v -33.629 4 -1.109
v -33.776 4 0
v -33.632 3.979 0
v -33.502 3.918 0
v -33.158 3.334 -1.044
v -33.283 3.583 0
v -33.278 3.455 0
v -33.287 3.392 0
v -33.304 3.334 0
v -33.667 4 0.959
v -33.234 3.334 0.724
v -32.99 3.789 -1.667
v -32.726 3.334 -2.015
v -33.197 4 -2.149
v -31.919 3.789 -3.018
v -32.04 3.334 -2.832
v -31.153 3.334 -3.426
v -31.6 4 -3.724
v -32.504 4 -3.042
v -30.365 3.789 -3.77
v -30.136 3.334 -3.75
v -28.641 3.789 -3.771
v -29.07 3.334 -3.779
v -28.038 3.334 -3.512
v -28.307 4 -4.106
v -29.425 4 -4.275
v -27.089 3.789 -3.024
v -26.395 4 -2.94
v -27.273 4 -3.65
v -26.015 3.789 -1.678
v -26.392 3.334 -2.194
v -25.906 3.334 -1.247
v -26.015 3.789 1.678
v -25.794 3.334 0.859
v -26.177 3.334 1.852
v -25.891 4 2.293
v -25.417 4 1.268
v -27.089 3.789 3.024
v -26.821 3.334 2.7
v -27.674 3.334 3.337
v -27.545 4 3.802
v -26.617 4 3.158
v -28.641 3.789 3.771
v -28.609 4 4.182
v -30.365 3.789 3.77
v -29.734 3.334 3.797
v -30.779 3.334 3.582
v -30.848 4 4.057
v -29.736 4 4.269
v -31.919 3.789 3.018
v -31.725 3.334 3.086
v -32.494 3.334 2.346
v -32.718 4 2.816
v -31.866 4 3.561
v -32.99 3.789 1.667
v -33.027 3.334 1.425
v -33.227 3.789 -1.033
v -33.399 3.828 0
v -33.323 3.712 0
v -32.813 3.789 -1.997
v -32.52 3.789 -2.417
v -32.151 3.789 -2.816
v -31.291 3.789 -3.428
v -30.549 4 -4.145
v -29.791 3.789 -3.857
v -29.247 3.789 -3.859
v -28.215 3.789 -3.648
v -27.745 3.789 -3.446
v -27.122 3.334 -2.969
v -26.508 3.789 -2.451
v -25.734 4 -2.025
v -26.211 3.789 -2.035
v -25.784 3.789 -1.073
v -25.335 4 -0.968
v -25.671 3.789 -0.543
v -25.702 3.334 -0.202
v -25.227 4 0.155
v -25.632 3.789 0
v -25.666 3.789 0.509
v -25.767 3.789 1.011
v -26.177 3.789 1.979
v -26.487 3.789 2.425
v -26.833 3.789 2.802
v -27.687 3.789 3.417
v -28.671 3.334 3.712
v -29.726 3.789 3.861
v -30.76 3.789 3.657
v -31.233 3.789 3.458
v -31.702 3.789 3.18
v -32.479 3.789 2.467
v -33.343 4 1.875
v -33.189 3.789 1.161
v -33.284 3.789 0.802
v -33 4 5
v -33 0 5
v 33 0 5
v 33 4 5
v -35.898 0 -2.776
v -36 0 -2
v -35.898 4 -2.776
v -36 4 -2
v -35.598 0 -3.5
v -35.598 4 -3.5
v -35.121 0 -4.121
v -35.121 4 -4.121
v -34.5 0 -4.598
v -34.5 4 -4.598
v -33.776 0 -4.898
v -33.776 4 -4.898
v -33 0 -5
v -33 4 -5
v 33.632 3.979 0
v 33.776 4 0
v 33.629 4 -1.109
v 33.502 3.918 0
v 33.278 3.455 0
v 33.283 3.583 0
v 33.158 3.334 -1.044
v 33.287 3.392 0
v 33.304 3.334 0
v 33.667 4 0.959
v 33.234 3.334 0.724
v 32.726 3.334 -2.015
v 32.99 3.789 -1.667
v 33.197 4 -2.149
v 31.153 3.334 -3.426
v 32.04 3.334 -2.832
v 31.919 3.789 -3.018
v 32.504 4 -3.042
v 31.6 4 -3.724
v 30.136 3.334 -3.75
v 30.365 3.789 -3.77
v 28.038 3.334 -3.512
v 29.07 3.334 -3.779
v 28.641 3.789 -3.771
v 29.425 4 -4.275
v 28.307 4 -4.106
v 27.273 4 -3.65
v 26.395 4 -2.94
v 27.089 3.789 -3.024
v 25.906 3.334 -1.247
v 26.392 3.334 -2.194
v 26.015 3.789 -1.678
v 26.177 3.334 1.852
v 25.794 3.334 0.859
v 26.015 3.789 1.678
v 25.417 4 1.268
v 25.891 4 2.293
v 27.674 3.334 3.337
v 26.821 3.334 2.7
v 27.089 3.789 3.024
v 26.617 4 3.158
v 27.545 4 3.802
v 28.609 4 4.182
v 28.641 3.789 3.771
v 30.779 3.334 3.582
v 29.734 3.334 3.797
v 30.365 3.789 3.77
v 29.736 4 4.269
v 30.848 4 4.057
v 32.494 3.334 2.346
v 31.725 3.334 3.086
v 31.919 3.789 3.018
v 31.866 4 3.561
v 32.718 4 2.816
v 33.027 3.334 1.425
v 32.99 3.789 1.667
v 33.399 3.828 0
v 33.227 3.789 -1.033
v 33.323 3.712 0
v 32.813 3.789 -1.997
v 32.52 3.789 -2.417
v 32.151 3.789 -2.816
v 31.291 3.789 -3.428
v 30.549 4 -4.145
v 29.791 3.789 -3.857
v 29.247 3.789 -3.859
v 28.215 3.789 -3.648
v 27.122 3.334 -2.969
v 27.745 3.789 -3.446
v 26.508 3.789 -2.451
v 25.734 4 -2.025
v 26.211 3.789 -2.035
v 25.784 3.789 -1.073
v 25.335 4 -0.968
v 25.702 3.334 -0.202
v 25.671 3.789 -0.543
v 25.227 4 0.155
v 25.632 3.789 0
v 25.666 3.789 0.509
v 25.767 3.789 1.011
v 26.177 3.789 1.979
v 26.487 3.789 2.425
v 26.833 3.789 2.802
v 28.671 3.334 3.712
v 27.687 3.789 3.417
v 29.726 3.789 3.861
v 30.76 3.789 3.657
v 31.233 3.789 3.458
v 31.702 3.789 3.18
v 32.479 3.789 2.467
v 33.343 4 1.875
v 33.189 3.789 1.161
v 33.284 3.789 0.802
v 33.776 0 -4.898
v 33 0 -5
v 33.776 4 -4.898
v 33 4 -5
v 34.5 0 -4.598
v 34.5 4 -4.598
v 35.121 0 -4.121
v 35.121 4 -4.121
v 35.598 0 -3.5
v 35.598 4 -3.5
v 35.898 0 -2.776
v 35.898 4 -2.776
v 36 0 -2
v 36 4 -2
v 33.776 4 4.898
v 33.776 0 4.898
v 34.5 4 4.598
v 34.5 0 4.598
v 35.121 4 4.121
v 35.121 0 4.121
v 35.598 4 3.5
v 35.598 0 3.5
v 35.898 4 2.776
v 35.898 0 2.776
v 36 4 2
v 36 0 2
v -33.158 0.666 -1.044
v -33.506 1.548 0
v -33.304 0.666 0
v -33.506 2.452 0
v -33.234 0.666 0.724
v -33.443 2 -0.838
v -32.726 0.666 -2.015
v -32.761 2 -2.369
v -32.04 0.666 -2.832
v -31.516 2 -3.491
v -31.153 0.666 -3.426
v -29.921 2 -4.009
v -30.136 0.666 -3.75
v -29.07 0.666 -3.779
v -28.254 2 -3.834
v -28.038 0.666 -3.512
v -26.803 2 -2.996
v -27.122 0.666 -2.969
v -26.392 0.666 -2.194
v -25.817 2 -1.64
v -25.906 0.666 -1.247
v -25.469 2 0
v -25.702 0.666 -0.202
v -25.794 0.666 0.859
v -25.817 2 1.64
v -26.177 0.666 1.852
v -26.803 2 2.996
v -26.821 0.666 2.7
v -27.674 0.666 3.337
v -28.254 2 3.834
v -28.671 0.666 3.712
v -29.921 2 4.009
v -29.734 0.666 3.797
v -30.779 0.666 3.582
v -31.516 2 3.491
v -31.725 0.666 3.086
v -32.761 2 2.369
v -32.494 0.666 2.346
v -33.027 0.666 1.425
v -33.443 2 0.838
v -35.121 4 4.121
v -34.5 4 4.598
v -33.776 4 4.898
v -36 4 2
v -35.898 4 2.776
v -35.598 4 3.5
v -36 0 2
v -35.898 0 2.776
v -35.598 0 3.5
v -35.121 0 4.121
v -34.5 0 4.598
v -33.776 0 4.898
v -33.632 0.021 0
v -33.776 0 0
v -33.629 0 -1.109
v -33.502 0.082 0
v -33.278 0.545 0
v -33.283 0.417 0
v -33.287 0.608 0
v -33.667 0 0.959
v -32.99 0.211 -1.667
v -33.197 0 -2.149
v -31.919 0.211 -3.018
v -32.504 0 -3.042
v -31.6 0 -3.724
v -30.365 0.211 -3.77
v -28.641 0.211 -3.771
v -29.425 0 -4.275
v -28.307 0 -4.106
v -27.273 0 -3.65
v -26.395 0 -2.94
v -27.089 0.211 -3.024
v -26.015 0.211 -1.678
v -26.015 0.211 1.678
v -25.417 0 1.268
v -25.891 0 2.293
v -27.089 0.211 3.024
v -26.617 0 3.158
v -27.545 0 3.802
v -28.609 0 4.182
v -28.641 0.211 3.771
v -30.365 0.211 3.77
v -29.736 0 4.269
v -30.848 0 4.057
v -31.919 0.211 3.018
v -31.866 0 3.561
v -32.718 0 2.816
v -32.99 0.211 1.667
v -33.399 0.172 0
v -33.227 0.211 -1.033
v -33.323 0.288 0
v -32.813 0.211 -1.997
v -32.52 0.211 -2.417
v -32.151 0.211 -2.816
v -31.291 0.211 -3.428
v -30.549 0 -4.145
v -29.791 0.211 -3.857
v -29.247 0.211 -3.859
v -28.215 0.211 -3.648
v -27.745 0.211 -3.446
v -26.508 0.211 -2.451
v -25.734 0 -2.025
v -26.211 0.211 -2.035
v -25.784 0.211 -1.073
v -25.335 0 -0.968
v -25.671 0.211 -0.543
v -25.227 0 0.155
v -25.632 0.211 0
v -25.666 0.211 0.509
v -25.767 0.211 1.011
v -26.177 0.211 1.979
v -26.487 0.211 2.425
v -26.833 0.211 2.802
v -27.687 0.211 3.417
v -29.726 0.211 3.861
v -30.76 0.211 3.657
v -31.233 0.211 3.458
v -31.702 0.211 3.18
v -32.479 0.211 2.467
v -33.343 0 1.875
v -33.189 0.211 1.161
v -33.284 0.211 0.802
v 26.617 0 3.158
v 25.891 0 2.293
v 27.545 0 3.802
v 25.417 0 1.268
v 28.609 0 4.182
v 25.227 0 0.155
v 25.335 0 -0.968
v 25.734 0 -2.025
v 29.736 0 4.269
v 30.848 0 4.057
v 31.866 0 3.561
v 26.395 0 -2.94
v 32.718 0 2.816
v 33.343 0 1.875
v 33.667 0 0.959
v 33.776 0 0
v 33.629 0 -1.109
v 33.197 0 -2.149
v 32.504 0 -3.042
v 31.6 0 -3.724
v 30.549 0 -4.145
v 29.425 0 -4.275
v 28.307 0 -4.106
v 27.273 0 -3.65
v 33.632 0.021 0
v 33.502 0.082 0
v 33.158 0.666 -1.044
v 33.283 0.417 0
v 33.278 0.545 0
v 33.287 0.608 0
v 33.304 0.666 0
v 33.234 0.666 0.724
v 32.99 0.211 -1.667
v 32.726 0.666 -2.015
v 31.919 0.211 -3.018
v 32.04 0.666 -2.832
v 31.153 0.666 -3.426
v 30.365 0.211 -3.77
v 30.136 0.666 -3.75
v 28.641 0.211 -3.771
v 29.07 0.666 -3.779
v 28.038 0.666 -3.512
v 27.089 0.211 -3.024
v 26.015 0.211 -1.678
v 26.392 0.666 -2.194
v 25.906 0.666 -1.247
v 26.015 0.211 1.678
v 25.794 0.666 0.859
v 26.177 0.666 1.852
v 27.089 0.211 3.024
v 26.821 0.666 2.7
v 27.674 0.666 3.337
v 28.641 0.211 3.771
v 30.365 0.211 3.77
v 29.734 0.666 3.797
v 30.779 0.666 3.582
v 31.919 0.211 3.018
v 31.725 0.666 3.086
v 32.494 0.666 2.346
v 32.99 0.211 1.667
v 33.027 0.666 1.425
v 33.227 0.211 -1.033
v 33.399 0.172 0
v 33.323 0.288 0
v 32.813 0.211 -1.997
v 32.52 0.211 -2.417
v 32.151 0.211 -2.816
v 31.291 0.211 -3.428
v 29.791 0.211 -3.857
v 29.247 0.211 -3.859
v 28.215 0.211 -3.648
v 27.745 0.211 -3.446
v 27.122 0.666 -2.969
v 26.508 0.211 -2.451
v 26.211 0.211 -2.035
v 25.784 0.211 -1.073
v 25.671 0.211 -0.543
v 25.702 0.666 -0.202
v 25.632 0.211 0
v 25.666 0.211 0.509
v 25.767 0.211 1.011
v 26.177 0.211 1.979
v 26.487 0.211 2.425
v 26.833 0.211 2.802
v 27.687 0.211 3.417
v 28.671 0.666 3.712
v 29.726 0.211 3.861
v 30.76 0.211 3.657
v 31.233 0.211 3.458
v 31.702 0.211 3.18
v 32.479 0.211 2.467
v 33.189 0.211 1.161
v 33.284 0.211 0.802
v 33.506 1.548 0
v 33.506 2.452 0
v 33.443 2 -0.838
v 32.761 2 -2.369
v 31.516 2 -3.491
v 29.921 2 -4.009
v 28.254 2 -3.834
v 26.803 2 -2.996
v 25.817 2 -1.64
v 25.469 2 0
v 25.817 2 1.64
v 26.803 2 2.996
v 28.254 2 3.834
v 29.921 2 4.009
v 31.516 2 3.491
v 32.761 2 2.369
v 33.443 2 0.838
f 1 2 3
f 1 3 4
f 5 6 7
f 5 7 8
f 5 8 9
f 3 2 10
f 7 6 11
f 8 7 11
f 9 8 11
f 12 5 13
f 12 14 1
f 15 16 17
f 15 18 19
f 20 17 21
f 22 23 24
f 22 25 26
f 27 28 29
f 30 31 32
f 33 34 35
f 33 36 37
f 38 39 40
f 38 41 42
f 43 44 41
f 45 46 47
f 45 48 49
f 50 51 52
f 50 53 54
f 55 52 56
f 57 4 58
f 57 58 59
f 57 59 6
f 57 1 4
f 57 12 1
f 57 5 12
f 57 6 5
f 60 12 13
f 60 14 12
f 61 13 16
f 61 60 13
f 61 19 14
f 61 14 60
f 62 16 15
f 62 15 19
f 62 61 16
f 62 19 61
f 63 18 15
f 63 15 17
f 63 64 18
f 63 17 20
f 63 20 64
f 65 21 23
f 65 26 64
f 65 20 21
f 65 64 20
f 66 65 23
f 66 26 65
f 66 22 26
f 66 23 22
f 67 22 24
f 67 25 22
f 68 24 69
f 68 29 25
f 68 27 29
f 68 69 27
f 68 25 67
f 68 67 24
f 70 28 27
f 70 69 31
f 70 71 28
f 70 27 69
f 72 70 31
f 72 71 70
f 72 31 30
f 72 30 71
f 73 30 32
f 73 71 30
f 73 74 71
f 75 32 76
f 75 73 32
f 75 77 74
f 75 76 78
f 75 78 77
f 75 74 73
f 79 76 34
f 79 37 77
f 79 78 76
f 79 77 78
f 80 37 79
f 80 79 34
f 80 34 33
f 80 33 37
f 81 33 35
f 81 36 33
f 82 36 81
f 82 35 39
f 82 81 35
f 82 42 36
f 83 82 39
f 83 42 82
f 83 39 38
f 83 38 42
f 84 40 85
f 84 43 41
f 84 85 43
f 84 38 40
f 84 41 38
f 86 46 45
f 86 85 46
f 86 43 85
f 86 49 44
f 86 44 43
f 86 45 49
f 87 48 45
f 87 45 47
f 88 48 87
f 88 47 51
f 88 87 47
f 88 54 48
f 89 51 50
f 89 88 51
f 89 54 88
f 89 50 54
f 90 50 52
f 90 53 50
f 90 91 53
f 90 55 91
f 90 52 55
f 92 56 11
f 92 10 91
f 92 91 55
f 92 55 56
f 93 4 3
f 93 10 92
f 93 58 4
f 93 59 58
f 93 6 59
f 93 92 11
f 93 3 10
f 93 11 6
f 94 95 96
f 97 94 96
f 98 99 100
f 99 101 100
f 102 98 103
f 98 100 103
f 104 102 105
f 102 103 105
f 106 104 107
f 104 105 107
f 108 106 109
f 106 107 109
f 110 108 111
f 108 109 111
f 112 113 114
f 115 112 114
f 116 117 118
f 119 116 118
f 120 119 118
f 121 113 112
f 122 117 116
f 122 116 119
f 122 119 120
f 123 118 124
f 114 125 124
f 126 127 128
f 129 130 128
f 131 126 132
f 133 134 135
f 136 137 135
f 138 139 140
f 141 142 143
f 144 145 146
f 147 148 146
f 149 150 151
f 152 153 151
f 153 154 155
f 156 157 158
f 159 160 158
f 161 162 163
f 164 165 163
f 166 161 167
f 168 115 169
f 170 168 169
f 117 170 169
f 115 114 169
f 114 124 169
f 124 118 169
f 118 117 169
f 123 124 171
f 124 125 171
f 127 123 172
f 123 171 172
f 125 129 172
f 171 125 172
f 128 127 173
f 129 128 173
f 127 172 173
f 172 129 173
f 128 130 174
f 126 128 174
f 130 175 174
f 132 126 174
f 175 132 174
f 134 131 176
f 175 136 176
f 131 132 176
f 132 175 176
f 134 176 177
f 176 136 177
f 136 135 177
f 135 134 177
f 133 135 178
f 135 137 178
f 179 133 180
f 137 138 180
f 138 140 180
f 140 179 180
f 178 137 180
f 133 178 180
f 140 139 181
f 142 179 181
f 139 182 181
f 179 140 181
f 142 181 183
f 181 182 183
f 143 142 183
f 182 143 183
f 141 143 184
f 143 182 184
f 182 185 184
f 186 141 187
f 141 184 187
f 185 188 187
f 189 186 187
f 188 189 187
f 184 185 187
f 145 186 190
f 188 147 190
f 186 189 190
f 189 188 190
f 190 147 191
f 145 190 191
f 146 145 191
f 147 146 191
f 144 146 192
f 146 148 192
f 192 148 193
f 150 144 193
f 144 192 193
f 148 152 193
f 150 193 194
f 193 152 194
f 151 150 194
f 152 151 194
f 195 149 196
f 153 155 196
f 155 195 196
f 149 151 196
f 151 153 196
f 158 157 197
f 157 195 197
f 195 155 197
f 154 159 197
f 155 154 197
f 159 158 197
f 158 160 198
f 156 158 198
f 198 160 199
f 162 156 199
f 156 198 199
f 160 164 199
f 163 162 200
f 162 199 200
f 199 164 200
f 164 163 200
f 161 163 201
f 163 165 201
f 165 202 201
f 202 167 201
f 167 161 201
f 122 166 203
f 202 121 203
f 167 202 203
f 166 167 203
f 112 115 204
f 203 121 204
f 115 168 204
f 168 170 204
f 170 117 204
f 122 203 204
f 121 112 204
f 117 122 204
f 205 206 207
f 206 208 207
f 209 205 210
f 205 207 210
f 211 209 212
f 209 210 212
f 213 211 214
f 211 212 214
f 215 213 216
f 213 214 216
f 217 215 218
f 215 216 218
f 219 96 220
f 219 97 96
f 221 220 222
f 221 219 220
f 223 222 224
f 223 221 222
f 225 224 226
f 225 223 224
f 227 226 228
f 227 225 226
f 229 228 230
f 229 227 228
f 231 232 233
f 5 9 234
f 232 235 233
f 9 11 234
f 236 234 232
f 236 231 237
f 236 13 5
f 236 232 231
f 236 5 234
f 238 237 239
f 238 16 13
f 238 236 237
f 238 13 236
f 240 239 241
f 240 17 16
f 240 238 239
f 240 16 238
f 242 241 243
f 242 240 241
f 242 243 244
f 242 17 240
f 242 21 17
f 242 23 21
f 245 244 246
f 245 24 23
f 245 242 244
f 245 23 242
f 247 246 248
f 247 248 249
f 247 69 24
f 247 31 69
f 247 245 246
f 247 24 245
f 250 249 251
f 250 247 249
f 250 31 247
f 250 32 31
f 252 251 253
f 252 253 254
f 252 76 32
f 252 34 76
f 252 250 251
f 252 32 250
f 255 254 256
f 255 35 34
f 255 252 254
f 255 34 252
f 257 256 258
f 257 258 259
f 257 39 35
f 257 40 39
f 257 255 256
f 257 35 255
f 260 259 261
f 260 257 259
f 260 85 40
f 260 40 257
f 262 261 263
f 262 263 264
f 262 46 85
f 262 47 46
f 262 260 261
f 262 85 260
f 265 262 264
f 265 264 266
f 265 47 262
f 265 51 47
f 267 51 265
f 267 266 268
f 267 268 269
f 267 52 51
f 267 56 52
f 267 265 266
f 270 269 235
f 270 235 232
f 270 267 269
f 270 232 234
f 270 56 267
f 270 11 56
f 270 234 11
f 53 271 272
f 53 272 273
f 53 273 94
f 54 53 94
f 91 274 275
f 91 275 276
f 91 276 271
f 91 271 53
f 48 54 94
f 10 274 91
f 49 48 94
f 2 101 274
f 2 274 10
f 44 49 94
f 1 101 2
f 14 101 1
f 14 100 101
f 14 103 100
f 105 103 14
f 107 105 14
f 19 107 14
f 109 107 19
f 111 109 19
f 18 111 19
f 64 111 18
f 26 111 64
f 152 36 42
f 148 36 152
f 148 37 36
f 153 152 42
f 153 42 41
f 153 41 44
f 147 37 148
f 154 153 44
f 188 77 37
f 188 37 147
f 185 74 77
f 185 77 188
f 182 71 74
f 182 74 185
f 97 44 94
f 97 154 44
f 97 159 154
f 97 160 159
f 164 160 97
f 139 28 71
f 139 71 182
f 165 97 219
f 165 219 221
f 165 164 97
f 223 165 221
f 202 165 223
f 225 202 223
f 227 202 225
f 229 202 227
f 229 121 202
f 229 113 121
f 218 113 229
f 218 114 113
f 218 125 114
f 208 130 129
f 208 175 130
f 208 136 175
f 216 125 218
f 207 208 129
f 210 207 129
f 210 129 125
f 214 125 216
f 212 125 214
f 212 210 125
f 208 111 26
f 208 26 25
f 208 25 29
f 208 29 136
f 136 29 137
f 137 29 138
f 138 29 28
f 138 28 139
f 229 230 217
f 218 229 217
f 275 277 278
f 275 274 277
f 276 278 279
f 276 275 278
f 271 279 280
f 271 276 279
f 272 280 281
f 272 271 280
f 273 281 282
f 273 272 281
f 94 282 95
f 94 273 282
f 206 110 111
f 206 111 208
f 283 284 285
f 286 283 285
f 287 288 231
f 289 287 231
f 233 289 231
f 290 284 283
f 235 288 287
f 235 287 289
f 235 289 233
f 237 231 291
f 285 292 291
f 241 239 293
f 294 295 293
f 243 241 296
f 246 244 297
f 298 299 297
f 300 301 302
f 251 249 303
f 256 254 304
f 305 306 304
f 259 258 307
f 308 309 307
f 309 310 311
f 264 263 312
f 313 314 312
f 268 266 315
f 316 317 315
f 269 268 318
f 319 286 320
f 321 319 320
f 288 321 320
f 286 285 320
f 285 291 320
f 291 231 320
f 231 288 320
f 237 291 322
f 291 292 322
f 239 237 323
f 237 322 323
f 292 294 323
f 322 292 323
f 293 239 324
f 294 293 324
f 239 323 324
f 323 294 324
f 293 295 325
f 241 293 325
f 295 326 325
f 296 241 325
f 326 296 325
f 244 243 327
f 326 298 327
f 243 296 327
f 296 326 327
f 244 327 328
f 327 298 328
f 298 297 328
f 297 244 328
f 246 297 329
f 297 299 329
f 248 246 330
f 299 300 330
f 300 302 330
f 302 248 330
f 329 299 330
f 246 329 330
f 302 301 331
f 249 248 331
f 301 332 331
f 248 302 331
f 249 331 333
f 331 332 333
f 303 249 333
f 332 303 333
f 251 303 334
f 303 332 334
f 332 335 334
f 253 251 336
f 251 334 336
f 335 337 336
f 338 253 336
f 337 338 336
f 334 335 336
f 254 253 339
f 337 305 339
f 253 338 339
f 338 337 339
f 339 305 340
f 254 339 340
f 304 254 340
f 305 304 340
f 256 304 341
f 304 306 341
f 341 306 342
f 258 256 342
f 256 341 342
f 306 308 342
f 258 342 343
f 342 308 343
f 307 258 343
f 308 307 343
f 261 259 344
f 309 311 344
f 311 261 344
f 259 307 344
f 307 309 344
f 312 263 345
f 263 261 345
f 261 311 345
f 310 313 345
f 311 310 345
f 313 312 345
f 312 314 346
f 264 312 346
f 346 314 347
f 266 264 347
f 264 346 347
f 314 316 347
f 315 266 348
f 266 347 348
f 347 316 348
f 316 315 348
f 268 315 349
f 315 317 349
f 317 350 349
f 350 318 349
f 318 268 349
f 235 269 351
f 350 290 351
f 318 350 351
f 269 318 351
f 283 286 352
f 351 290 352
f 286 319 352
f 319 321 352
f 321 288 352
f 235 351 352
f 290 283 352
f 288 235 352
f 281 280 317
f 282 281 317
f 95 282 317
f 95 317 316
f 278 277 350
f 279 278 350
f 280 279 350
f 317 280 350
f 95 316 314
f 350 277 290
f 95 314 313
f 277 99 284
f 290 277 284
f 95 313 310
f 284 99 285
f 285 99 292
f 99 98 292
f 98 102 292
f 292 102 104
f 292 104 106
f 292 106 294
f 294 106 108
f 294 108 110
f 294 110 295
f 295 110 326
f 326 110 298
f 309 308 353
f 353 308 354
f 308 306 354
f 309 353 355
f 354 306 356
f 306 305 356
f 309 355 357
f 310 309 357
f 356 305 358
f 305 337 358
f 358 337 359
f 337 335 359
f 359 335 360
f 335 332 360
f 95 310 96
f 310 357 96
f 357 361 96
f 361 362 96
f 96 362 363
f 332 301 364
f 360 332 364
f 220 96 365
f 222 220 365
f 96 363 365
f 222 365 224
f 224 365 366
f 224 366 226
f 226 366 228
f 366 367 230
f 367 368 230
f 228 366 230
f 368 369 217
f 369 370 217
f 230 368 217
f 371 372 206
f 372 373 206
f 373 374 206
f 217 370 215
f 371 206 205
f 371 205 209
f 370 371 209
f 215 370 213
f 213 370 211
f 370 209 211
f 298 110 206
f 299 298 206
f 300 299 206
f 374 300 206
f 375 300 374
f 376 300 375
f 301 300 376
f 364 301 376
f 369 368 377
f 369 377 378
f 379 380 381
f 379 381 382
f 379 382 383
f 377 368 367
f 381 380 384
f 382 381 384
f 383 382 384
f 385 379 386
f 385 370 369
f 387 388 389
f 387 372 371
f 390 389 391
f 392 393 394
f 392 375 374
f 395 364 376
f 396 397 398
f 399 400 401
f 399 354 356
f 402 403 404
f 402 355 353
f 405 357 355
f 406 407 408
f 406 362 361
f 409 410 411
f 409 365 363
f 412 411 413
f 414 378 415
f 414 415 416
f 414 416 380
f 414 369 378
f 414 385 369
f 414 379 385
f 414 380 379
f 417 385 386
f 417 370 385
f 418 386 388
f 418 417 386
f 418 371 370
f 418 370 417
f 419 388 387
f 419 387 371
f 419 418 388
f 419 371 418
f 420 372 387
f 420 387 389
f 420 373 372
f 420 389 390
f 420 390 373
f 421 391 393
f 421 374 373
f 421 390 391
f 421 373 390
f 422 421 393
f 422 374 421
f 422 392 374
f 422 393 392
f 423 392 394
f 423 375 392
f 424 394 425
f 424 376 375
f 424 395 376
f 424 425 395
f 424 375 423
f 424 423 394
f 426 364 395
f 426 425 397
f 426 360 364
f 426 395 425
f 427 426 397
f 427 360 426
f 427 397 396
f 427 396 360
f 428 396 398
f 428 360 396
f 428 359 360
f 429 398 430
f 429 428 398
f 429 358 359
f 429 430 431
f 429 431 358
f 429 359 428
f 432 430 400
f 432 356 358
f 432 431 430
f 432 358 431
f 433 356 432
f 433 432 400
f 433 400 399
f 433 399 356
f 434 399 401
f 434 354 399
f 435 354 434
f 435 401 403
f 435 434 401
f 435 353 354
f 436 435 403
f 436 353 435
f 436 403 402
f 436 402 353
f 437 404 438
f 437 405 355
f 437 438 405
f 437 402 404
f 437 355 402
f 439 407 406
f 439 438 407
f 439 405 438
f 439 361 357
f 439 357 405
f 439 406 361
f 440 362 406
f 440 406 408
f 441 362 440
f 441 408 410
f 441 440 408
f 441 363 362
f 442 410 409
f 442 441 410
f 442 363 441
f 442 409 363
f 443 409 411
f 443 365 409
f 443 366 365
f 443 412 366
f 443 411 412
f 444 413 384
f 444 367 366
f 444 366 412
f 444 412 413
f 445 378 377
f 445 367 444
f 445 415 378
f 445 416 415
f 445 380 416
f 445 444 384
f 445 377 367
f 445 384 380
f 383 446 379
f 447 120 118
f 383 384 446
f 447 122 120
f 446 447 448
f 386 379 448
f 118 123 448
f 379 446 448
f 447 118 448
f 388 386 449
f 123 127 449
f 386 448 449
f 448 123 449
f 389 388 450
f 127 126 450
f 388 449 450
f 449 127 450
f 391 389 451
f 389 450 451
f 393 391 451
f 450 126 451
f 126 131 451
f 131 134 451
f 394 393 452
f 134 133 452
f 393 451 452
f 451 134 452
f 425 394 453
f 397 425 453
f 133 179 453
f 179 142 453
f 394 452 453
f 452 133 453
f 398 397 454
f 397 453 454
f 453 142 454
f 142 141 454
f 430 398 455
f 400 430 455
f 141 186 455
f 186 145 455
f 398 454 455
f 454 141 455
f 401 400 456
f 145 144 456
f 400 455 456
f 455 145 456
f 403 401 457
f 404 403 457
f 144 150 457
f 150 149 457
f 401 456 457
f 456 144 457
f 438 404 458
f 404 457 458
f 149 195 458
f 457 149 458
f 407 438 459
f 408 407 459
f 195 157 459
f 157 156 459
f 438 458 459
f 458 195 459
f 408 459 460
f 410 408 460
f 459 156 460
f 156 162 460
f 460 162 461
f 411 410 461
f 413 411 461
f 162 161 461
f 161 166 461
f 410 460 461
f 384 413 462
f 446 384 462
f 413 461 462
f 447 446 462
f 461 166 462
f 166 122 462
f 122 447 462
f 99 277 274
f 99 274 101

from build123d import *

# Parameters (mm, degrees)
SKETCH1_W           = 72
SKETCH1_H           = 10
BOSS_EXTRUDE1_DEPTH = 4
FILLET1_R           = 3
FILLET2_R           = 0.5


with BuildPart() as part:
    # Sketch1 → Boss-Extrude1 (new body)
    with BuildSketch(Plane(origin=(0, 0, 0), x_dir=(1, 0, 0), z_dir=(0, 1, 0))):
        Rectangle(SKETCH1_W, SKETCH1_H)
    extrude(amount=BOSS_EXTRUDE1_DEPTH)

    # Sketch2 → Cut-Revolve2 (revolve, cut)
    with BuildSketch(Plane.XY):
        with BuildLine():
            Line((-29.5, 4), (-29.5, 0))
            Line((-29.5, 0), (-33, 0))
            ThreePointArc((-33, 0), (-33.531128874, 2), (-33, 4))
            Line((-33, 4), (-29.5, 4))
        make_face()
    cut_revolve2 = revolve(axis=Axis((-29.5, 4, 0), (0, -1, 0)), mode=Mode.SUBTRACT)

    # Fillet1
    fillet1_edges = [part.edges().sort_by_distance(p)[0] for p in [
        (36, 2, 5),
        (-36, 2, 5),
        (-36, 2, -5),
        (36, 2, -5),
    ]]
    fillet(fillet1_edges, radius=FILLET1_R)

    # Mirror1: Cut-Revolve2 across plane
    add(cut_revolve2.mirror(Plane(origin=(0, 0, 0), x_dir=(0, 0, 1), z_dir=(1, 0, 0))), mode=Mode.SUBTRACT)

    # Fillet2
    fillet2_edges = [part.edges().sort_by_distance(p)[0] for p in [
        (-26, 4, 0),
        (-26, 0, 0),
        (26, 4, 0),
        (26, 0, 0),
    ]]
    fillet(fillet2_edges, radius=FILLET2_R)


solid = part.part
